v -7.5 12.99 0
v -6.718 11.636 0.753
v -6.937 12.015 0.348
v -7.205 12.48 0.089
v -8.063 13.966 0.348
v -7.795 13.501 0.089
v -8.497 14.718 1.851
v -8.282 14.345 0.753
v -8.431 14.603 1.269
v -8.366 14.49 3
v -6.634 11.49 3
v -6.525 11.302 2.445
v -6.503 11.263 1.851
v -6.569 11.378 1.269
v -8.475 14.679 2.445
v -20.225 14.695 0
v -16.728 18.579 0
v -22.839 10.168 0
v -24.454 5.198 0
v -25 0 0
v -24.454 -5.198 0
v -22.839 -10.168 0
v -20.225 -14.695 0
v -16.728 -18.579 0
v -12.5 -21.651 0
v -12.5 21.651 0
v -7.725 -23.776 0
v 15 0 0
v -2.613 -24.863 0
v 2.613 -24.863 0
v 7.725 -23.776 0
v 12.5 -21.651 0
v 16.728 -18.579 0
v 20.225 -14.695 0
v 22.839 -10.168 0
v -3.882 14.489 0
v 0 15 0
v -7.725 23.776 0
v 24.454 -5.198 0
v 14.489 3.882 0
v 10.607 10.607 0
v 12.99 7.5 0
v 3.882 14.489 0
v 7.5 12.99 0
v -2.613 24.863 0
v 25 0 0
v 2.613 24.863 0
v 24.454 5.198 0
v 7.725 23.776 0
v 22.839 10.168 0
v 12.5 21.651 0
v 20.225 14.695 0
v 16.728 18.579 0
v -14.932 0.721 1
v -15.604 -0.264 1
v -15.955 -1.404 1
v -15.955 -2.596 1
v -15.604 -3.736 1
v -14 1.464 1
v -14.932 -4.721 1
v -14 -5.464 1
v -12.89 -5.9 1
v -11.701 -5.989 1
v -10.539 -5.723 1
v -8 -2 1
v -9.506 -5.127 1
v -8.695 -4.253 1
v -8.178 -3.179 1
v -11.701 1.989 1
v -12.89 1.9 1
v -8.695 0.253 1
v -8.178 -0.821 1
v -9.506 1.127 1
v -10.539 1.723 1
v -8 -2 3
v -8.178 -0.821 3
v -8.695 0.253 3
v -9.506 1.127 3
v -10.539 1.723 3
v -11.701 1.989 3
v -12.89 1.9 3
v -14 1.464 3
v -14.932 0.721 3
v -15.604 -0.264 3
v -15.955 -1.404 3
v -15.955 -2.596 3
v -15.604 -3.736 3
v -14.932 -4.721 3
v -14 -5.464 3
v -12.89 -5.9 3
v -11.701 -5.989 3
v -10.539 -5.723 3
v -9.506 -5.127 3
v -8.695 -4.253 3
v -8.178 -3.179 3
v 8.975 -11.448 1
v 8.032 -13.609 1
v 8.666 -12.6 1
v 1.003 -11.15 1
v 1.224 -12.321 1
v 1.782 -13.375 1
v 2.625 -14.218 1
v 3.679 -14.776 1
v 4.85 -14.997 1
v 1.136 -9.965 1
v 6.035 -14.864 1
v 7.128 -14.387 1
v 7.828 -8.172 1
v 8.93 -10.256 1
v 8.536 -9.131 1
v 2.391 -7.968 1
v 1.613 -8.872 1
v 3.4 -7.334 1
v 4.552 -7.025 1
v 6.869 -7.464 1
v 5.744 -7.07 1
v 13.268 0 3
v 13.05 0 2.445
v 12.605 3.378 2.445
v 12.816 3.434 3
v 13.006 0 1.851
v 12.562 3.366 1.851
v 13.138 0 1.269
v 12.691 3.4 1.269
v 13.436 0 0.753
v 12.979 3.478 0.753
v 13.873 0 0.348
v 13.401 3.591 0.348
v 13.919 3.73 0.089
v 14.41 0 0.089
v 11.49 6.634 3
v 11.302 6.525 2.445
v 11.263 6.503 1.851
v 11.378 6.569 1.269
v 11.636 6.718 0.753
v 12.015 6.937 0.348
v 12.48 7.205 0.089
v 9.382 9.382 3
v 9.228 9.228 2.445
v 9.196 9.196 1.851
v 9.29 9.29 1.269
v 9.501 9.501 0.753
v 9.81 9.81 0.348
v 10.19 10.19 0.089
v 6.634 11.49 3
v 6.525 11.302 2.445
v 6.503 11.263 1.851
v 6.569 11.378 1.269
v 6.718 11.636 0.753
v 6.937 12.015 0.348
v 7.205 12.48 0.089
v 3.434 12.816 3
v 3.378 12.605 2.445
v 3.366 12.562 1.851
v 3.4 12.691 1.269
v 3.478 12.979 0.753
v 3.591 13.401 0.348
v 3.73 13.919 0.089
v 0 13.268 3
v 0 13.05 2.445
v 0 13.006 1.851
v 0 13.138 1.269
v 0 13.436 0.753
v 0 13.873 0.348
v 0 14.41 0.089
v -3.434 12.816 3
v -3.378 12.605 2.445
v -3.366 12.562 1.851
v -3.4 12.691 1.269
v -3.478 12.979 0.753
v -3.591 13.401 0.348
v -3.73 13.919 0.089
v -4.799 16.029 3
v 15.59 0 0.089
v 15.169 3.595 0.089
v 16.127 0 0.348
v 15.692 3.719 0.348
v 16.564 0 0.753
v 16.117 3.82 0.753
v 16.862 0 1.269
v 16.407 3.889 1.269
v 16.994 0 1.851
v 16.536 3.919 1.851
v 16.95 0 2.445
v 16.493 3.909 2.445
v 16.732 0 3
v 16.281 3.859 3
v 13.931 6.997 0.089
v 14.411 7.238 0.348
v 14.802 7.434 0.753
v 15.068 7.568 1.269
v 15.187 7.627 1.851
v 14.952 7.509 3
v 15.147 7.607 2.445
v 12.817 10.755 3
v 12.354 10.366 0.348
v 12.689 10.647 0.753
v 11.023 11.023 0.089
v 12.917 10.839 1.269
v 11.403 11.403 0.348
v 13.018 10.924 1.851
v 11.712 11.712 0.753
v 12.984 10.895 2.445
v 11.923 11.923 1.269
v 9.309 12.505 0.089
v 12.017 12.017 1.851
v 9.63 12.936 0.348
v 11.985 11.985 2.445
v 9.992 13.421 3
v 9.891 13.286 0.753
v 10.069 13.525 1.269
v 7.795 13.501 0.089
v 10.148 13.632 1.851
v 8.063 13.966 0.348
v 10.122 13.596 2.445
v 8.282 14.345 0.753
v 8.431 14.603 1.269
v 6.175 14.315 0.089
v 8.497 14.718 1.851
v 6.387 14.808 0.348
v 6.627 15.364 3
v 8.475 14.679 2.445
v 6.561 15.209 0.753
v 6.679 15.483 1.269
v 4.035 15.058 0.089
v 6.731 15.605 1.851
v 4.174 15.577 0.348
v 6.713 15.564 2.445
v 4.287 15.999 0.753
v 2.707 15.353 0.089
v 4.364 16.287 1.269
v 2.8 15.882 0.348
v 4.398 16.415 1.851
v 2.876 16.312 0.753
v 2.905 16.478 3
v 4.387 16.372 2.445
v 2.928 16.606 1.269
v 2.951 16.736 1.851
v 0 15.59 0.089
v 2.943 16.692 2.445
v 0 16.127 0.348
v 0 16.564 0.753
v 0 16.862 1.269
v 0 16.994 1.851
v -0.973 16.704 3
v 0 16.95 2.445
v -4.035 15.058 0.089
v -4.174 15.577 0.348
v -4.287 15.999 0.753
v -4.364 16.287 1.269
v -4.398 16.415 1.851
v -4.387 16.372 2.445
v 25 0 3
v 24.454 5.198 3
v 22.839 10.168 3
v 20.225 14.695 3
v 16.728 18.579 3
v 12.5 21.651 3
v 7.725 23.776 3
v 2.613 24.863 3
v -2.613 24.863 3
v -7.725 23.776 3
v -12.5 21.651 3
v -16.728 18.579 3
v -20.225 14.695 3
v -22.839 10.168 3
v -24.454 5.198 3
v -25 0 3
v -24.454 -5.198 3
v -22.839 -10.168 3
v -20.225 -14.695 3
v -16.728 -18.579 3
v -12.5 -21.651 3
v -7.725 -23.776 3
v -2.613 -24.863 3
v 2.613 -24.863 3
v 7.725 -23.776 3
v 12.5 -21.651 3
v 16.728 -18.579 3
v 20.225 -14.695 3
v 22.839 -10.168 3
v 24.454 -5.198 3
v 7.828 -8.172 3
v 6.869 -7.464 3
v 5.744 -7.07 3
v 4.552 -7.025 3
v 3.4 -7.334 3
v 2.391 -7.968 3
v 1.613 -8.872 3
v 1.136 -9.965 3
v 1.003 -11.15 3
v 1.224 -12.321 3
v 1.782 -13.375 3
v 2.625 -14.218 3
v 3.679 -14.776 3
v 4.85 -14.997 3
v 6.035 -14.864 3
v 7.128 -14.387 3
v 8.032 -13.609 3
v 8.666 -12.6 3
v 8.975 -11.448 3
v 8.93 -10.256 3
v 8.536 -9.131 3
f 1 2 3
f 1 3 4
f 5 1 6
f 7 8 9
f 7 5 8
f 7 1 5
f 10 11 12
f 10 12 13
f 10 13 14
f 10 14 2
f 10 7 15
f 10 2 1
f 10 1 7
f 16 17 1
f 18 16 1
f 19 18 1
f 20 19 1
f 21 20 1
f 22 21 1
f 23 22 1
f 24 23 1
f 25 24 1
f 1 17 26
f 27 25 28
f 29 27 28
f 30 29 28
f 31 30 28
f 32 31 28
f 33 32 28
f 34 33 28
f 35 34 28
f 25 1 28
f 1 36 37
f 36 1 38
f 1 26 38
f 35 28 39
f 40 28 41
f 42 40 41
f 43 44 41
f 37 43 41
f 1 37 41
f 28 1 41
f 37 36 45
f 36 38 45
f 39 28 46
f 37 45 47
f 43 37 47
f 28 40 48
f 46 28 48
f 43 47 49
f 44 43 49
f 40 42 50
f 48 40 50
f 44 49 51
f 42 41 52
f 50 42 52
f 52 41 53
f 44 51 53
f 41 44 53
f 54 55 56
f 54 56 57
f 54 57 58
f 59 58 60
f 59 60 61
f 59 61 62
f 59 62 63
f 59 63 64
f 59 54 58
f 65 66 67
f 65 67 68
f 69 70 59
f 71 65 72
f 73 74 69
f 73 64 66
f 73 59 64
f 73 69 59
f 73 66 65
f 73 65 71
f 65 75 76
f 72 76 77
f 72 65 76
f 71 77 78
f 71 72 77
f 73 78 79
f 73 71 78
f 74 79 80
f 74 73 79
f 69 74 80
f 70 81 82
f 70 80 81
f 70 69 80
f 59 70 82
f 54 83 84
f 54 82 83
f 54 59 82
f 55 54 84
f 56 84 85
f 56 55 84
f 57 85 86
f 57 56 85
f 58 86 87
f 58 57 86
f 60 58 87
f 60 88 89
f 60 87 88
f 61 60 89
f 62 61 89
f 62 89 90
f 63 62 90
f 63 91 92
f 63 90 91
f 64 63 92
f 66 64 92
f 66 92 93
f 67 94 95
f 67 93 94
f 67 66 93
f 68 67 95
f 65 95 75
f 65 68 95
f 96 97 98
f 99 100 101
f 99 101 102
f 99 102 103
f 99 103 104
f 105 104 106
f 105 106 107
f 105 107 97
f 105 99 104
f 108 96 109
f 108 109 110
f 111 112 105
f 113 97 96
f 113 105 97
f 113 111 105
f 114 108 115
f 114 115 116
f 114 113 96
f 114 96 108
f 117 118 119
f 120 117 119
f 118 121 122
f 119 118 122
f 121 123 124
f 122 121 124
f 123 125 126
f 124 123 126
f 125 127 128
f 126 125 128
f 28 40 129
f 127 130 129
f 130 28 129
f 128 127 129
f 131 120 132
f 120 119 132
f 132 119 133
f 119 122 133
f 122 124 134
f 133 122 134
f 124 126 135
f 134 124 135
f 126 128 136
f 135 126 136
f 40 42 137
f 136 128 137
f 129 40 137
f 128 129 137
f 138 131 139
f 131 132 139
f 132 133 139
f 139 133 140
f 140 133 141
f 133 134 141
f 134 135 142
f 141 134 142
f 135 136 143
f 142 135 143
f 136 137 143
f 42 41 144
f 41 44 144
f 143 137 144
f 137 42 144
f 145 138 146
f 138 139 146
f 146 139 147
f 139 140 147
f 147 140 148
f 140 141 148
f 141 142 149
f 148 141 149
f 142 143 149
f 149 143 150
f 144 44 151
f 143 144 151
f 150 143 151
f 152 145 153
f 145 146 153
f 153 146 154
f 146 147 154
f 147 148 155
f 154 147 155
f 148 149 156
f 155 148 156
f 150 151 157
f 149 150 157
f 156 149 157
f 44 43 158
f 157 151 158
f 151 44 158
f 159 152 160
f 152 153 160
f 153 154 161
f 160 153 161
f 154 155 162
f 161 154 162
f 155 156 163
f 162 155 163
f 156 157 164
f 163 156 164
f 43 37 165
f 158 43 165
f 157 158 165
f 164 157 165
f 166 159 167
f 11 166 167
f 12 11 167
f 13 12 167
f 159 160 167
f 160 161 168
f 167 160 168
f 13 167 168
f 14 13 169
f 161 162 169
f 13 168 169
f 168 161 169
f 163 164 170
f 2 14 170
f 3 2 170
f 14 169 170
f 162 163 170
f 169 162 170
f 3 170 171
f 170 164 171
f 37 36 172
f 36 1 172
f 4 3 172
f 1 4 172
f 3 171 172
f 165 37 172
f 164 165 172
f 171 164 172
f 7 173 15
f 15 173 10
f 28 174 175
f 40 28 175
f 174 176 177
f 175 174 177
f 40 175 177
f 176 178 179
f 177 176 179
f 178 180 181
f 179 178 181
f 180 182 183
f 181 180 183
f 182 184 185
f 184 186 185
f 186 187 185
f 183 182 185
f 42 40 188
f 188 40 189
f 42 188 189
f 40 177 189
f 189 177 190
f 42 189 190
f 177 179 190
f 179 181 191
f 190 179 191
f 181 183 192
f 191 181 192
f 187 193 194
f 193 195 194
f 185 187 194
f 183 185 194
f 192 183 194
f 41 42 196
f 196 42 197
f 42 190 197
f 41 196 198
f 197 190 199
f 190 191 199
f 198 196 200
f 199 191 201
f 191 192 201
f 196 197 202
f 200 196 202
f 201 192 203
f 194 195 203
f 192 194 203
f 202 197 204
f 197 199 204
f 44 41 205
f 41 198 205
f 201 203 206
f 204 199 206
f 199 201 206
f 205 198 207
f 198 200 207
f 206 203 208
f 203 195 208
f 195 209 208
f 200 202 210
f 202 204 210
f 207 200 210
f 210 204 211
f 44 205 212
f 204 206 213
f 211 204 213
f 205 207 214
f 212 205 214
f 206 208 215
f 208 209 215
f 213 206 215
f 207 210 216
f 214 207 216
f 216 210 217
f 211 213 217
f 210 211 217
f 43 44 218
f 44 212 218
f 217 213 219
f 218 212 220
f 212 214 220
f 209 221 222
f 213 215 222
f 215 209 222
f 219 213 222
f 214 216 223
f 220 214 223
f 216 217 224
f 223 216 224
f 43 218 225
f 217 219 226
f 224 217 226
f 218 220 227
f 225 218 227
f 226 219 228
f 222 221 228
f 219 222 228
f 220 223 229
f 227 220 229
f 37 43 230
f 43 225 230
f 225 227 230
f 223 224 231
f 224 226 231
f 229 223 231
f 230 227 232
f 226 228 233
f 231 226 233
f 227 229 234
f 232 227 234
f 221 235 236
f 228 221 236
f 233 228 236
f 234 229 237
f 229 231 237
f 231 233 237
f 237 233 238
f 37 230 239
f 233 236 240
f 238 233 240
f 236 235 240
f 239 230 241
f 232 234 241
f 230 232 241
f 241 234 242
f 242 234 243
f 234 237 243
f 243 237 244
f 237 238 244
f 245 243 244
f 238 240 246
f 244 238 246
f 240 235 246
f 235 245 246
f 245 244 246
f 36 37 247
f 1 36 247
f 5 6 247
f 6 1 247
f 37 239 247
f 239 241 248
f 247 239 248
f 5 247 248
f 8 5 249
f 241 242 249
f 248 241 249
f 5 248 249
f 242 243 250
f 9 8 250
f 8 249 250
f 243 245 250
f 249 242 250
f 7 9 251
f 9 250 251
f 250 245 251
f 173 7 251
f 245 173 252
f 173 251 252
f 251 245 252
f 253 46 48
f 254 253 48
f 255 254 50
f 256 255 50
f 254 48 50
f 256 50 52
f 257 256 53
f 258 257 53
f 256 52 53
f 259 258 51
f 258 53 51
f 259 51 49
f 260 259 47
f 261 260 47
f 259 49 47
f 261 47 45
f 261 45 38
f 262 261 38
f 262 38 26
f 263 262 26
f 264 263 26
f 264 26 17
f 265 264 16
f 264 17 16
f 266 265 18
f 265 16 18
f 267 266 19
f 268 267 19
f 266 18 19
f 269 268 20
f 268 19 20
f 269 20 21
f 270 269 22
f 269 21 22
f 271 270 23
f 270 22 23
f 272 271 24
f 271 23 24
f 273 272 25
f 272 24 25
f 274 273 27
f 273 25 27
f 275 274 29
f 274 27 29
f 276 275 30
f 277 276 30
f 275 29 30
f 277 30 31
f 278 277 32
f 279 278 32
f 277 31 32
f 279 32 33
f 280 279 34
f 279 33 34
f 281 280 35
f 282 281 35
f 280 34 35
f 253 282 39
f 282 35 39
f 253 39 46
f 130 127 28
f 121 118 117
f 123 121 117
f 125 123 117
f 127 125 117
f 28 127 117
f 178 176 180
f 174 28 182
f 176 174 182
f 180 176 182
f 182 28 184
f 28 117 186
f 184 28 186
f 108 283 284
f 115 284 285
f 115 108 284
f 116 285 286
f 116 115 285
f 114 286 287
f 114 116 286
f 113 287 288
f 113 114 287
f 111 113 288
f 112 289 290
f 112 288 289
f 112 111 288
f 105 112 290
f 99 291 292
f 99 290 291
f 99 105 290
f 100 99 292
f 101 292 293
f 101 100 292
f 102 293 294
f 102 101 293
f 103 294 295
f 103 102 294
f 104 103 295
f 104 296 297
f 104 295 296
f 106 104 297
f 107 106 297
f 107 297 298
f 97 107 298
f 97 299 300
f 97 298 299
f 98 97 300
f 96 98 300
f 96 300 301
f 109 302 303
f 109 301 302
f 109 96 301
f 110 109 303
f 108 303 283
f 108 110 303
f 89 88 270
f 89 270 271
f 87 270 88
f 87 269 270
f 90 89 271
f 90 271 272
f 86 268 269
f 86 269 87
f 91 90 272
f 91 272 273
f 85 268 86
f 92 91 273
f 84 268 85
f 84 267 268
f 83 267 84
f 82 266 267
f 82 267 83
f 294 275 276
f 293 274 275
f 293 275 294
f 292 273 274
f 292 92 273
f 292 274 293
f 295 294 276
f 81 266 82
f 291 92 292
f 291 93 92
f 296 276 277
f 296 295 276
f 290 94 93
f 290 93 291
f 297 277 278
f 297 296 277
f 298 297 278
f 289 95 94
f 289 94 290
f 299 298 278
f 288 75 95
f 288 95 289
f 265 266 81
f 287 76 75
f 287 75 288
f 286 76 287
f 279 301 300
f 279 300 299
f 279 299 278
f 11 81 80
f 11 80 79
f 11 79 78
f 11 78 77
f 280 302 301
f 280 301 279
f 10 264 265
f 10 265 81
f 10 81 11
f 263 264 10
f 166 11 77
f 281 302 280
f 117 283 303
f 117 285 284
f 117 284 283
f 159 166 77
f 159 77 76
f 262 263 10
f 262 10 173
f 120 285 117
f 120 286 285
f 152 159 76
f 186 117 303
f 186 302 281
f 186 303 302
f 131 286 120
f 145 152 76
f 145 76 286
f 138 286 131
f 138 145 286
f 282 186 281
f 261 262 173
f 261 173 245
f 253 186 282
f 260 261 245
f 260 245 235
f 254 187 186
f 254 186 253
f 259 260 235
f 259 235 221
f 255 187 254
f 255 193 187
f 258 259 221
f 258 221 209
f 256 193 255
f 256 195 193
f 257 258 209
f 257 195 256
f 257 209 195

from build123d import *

# Parameters (mm, degrees)
CYLINDER001_R               = 4
CYLINDER001_DEPTH           = 4
CYLINDER001_PLACEMENT_ANGLE = 45
CYLINDER002_R               = 4
CYLINDER002_DEPTH           = 10
TORUS_R                     = 2
TORUS_ANGLE                 = 120
CYLINDER_R                  = 25
CYLINDER_DEPTH              = 3


with BuildPart() as cilindre001:
    # Cylinder001 → Cylinder001 (new body)
    with BuildSketch(Plane.XY):
        Circle(CYLINDER001_R)
    extrude(amount=CYLINDER001_DEPTH)


with BuildPart() as cilindre001_1:
    # Cylinder001 placement: moved
    add(cilindre001.part.moved(Location((5, -11, 1))).rotate(Axis((5, -11, 1), (0, 0, 1)), CYLINDER001_PLACEMENT_ANGLE))


with BuildPart() as cilindre002:
    # Cylinder002 → Cylinder002 (new body)
    with BuildSketch(Plane(origin=(-12, -2, 1), x_dir=(1, 0, 0), z_dir=(0, 0, 1))):
        Circle(CYLINDER002_R)
    extrude(amount=CYLINDER002_DEPTH)


with BuildPart() as torus:
    # Torus → Torus (revolve)
    with BuildSketch(Plane(origin=(0, 0, 2), x_dir=(1, 0, 0), z_dir=(0, -1, 0))):
        with Locations((15, 0)):
            Circle(TORUS_R)
    revolve(axis=Axis((0, 0, 2), (0, 0, 1)), revolution_arc=TORUS_ANGLE)


with BuildPart() as cut002:
    # Cylinder → Cylinder (new body)
    with BuildSketch(Plane.XY):
        Circle(CYLINDER_R)
    extrude(amount=CYLINDER_DEPTH)

    # Cut: cut Torus
    add(torus.part, mode=Mode.SUBTRACT)

    # Cut001: cut Cilindre002
    add(cilindre002.part, mode=Mode.SUBTRACT)

    # Cut002: cut Cilindre001
    add(cilindre001_1.part, mode=Mode.SUBTRACT)


solid = cut002.part
